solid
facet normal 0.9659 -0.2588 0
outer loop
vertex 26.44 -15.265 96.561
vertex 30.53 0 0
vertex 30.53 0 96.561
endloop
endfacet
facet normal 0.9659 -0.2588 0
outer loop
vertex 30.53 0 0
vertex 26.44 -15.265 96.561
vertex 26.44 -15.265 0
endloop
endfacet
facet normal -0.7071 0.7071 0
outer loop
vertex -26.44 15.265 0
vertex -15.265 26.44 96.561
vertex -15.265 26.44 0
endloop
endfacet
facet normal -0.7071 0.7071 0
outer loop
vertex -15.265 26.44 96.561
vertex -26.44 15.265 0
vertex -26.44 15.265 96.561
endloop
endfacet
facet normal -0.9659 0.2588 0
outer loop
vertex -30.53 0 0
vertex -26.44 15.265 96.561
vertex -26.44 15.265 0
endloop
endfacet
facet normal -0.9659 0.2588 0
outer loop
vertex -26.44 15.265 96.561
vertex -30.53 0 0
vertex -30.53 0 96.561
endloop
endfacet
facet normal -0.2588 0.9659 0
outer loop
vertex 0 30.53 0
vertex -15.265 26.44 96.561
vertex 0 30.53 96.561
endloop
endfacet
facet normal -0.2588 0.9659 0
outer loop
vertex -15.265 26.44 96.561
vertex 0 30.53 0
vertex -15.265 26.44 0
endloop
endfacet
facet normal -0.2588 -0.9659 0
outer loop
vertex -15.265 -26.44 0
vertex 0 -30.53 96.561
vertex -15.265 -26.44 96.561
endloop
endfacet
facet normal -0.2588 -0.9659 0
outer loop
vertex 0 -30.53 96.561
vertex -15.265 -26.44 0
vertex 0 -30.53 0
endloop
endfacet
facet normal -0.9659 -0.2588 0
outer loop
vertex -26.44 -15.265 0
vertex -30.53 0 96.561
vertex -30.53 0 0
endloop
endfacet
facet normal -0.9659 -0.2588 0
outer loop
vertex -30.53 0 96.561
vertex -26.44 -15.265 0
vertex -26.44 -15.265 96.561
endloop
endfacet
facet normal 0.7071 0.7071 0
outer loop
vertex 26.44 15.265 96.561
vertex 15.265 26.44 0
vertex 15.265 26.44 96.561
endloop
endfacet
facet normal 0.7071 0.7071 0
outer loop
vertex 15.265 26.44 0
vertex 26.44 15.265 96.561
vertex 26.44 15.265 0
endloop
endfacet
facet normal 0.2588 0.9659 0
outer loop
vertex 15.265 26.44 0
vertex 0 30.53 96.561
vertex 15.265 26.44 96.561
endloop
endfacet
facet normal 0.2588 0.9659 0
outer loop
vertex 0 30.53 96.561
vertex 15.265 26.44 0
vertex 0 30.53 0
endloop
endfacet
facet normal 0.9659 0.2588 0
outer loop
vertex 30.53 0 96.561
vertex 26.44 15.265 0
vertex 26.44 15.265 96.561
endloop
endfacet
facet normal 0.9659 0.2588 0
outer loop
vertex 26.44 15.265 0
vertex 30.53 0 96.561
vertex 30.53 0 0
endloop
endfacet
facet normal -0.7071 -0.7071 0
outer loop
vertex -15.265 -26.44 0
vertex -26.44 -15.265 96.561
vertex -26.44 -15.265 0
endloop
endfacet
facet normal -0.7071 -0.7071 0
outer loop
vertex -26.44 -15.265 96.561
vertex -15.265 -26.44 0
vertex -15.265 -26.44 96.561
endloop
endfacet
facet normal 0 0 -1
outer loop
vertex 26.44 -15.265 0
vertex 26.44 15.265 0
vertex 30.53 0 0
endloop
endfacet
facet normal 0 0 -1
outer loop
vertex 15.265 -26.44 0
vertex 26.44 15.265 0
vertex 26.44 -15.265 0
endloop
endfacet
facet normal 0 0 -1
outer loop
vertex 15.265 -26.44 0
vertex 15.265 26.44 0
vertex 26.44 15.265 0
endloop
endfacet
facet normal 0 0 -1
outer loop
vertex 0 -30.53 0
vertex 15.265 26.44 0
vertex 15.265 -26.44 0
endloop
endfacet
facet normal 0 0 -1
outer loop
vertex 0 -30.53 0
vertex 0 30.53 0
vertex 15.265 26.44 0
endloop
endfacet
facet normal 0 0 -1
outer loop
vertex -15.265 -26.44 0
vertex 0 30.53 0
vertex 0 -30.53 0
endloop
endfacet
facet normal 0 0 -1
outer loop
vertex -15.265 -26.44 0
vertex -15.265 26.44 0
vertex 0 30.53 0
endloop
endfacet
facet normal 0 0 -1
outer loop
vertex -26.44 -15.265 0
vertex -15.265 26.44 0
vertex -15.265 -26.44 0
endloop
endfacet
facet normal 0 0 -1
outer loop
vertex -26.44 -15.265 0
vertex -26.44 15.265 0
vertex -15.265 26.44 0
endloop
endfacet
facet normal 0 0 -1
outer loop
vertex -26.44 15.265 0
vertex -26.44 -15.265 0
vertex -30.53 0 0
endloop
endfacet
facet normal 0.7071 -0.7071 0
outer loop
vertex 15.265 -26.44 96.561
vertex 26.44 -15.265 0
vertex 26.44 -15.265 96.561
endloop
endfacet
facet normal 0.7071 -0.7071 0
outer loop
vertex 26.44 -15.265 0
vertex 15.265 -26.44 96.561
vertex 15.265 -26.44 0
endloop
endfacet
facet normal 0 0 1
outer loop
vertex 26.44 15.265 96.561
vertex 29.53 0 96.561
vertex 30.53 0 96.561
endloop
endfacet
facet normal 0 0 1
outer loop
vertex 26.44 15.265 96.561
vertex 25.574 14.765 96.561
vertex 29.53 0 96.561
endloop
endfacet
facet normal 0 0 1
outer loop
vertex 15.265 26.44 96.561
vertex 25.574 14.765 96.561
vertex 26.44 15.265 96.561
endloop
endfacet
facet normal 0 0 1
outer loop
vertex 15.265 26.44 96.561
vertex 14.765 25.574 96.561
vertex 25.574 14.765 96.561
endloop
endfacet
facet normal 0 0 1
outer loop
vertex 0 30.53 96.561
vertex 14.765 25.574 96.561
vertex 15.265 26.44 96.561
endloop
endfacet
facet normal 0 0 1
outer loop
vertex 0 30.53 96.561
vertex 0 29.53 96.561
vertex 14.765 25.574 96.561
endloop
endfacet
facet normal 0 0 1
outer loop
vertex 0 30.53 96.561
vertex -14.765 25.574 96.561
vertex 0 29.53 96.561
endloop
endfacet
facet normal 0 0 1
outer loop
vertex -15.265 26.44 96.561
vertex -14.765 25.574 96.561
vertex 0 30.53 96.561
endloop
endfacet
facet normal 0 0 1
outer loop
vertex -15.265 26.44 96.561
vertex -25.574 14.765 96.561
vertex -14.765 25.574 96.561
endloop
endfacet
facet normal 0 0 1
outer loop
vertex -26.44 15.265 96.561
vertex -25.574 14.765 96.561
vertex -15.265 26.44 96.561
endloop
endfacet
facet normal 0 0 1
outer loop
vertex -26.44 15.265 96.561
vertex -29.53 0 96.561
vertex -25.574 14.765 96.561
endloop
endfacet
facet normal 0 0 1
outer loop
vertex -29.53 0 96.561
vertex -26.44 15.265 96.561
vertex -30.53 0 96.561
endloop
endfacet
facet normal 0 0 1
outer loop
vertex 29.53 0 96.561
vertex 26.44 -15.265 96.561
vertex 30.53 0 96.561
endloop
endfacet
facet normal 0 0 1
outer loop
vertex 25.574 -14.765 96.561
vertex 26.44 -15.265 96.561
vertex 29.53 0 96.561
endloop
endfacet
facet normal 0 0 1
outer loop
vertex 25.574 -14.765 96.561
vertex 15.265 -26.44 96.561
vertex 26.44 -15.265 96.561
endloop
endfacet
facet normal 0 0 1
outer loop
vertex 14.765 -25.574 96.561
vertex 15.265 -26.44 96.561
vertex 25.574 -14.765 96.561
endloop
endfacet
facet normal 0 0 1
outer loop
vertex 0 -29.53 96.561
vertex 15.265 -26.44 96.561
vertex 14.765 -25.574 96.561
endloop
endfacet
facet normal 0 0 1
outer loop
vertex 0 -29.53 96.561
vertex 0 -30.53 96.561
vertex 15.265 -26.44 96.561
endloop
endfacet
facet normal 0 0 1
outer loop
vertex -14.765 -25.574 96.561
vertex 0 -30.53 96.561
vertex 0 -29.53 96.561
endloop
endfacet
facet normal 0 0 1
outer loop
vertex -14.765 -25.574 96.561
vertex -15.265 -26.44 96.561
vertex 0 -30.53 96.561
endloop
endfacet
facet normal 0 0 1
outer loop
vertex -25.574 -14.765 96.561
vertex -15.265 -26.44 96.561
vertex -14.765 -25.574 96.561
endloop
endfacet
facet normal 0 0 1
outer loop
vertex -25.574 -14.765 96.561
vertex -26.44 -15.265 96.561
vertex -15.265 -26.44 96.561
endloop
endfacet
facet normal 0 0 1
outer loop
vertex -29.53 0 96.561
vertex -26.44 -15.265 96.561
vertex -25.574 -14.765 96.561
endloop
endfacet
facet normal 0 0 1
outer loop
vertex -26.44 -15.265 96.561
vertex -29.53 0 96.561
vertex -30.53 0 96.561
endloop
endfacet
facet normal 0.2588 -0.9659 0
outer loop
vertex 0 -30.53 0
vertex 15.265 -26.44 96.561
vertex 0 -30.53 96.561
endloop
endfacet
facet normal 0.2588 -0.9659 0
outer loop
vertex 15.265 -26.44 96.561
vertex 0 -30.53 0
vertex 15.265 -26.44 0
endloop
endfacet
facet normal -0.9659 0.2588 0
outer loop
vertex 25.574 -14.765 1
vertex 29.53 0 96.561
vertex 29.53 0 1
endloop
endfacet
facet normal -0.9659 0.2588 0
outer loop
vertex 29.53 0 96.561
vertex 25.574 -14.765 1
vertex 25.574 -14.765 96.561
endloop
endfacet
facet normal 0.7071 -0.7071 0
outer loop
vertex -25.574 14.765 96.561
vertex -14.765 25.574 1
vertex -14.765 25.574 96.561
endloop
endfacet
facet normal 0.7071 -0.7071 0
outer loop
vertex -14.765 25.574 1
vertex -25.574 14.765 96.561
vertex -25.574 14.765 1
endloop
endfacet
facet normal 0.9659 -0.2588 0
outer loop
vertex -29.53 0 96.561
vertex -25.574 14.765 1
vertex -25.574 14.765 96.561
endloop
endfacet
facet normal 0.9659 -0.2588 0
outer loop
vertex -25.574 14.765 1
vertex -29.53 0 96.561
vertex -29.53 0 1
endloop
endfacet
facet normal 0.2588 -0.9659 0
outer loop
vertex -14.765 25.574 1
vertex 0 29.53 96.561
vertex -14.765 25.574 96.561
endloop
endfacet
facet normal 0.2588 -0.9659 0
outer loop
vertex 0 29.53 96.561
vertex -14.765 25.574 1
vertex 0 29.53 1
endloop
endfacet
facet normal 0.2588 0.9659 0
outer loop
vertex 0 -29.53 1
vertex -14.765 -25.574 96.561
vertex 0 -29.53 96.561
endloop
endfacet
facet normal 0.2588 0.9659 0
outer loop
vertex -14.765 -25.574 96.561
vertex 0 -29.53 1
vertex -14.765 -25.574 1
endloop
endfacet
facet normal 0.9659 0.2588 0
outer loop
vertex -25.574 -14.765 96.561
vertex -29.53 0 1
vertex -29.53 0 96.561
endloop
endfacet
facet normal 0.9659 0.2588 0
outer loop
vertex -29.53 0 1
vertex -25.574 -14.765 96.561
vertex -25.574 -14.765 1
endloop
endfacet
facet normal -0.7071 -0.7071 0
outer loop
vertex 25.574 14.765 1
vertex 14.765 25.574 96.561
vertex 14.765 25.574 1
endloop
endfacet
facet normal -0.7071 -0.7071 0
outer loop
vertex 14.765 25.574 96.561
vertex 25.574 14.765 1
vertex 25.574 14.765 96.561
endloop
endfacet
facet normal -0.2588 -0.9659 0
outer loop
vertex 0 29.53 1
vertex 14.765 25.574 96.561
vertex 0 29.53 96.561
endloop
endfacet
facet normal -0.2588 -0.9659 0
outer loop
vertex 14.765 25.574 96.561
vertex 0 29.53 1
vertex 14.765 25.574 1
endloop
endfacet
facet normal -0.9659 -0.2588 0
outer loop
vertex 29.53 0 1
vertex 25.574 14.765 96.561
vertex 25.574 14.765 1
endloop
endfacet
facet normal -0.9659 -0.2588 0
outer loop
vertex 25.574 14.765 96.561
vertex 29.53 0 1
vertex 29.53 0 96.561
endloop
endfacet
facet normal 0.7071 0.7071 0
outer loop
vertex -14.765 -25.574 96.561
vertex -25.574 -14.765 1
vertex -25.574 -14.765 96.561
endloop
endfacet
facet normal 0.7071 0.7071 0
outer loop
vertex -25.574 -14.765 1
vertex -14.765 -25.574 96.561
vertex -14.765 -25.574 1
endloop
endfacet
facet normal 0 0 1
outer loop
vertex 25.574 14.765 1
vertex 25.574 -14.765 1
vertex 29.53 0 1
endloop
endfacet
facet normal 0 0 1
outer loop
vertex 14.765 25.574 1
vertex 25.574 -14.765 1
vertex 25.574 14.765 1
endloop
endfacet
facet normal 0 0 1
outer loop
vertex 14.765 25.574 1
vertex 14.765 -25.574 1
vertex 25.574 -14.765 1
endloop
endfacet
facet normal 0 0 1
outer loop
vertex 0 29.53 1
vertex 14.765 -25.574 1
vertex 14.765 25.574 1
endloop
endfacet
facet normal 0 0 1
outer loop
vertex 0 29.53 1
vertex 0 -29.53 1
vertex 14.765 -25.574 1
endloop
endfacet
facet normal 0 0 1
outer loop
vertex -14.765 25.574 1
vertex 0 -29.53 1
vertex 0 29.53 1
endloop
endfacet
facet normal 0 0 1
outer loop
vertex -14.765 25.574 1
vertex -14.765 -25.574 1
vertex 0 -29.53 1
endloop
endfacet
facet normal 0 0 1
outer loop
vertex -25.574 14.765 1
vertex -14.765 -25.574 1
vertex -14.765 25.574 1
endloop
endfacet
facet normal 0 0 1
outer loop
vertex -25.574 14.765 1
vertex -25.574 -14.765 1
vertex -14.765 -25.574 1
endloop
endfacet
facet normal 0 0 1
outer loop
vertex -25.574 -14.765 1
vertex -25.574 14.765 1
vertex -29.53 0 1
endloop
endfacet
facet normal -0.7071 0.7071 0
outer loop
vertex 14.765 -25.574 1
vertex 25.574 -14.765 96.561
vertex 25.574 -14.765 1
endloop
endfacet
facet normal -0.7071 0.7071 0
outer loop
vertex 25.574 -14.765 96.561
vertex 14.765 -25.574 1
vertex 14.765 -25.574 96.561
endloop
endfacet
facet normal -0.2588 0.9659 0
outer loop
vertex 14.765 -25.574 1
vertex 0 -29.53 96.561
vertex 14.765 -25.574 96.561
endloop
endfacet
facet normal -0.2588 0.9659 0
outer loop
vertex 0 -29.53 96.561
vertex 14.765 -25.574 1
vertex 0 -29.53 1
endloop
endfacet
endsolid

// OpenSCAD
/* Input Parameters */

volume=250; /* The target volume of the container. */

conversion=1; // [1:Milliliters (mL),29.5735:Fluid Ounces (fl oz),236.5882:Cups (c)]

sides=12; /* The number of sides to use for the polygon based cylinder. */

// (mm)
thickness=1; /* The thickness of the walls and bottom of the container. */

shape=1; // [1:Tall,0:Wide]

// calculations
ratio=0.6180+shape;
volume_mm3=volume*conversion*1000; // convert ml input into mm3 for calculations
internal_radius=pow(volume_mm3/(sin(180/sides)*cos(180/sides)*sides*ratio*2),1/3);
internal_height=internal_radius*ratio*2;
external_radius=internal_radius+thickness;
external_height=internal_height+thickness;

// statistics
echo("Required XY",external_radius*2);
echo("Required Z",external_height);

// rendering
$fn=sides;
translate([0,0,external_height]){
	rotate([0,180,0]){
		difference(){
			cylinder(r=external_radius,h=external_height);
			translate([0,0,-0.1]){
				cylinder(r=internal_radius,h=internal_height+0.1);
			}
		}
	}
}
